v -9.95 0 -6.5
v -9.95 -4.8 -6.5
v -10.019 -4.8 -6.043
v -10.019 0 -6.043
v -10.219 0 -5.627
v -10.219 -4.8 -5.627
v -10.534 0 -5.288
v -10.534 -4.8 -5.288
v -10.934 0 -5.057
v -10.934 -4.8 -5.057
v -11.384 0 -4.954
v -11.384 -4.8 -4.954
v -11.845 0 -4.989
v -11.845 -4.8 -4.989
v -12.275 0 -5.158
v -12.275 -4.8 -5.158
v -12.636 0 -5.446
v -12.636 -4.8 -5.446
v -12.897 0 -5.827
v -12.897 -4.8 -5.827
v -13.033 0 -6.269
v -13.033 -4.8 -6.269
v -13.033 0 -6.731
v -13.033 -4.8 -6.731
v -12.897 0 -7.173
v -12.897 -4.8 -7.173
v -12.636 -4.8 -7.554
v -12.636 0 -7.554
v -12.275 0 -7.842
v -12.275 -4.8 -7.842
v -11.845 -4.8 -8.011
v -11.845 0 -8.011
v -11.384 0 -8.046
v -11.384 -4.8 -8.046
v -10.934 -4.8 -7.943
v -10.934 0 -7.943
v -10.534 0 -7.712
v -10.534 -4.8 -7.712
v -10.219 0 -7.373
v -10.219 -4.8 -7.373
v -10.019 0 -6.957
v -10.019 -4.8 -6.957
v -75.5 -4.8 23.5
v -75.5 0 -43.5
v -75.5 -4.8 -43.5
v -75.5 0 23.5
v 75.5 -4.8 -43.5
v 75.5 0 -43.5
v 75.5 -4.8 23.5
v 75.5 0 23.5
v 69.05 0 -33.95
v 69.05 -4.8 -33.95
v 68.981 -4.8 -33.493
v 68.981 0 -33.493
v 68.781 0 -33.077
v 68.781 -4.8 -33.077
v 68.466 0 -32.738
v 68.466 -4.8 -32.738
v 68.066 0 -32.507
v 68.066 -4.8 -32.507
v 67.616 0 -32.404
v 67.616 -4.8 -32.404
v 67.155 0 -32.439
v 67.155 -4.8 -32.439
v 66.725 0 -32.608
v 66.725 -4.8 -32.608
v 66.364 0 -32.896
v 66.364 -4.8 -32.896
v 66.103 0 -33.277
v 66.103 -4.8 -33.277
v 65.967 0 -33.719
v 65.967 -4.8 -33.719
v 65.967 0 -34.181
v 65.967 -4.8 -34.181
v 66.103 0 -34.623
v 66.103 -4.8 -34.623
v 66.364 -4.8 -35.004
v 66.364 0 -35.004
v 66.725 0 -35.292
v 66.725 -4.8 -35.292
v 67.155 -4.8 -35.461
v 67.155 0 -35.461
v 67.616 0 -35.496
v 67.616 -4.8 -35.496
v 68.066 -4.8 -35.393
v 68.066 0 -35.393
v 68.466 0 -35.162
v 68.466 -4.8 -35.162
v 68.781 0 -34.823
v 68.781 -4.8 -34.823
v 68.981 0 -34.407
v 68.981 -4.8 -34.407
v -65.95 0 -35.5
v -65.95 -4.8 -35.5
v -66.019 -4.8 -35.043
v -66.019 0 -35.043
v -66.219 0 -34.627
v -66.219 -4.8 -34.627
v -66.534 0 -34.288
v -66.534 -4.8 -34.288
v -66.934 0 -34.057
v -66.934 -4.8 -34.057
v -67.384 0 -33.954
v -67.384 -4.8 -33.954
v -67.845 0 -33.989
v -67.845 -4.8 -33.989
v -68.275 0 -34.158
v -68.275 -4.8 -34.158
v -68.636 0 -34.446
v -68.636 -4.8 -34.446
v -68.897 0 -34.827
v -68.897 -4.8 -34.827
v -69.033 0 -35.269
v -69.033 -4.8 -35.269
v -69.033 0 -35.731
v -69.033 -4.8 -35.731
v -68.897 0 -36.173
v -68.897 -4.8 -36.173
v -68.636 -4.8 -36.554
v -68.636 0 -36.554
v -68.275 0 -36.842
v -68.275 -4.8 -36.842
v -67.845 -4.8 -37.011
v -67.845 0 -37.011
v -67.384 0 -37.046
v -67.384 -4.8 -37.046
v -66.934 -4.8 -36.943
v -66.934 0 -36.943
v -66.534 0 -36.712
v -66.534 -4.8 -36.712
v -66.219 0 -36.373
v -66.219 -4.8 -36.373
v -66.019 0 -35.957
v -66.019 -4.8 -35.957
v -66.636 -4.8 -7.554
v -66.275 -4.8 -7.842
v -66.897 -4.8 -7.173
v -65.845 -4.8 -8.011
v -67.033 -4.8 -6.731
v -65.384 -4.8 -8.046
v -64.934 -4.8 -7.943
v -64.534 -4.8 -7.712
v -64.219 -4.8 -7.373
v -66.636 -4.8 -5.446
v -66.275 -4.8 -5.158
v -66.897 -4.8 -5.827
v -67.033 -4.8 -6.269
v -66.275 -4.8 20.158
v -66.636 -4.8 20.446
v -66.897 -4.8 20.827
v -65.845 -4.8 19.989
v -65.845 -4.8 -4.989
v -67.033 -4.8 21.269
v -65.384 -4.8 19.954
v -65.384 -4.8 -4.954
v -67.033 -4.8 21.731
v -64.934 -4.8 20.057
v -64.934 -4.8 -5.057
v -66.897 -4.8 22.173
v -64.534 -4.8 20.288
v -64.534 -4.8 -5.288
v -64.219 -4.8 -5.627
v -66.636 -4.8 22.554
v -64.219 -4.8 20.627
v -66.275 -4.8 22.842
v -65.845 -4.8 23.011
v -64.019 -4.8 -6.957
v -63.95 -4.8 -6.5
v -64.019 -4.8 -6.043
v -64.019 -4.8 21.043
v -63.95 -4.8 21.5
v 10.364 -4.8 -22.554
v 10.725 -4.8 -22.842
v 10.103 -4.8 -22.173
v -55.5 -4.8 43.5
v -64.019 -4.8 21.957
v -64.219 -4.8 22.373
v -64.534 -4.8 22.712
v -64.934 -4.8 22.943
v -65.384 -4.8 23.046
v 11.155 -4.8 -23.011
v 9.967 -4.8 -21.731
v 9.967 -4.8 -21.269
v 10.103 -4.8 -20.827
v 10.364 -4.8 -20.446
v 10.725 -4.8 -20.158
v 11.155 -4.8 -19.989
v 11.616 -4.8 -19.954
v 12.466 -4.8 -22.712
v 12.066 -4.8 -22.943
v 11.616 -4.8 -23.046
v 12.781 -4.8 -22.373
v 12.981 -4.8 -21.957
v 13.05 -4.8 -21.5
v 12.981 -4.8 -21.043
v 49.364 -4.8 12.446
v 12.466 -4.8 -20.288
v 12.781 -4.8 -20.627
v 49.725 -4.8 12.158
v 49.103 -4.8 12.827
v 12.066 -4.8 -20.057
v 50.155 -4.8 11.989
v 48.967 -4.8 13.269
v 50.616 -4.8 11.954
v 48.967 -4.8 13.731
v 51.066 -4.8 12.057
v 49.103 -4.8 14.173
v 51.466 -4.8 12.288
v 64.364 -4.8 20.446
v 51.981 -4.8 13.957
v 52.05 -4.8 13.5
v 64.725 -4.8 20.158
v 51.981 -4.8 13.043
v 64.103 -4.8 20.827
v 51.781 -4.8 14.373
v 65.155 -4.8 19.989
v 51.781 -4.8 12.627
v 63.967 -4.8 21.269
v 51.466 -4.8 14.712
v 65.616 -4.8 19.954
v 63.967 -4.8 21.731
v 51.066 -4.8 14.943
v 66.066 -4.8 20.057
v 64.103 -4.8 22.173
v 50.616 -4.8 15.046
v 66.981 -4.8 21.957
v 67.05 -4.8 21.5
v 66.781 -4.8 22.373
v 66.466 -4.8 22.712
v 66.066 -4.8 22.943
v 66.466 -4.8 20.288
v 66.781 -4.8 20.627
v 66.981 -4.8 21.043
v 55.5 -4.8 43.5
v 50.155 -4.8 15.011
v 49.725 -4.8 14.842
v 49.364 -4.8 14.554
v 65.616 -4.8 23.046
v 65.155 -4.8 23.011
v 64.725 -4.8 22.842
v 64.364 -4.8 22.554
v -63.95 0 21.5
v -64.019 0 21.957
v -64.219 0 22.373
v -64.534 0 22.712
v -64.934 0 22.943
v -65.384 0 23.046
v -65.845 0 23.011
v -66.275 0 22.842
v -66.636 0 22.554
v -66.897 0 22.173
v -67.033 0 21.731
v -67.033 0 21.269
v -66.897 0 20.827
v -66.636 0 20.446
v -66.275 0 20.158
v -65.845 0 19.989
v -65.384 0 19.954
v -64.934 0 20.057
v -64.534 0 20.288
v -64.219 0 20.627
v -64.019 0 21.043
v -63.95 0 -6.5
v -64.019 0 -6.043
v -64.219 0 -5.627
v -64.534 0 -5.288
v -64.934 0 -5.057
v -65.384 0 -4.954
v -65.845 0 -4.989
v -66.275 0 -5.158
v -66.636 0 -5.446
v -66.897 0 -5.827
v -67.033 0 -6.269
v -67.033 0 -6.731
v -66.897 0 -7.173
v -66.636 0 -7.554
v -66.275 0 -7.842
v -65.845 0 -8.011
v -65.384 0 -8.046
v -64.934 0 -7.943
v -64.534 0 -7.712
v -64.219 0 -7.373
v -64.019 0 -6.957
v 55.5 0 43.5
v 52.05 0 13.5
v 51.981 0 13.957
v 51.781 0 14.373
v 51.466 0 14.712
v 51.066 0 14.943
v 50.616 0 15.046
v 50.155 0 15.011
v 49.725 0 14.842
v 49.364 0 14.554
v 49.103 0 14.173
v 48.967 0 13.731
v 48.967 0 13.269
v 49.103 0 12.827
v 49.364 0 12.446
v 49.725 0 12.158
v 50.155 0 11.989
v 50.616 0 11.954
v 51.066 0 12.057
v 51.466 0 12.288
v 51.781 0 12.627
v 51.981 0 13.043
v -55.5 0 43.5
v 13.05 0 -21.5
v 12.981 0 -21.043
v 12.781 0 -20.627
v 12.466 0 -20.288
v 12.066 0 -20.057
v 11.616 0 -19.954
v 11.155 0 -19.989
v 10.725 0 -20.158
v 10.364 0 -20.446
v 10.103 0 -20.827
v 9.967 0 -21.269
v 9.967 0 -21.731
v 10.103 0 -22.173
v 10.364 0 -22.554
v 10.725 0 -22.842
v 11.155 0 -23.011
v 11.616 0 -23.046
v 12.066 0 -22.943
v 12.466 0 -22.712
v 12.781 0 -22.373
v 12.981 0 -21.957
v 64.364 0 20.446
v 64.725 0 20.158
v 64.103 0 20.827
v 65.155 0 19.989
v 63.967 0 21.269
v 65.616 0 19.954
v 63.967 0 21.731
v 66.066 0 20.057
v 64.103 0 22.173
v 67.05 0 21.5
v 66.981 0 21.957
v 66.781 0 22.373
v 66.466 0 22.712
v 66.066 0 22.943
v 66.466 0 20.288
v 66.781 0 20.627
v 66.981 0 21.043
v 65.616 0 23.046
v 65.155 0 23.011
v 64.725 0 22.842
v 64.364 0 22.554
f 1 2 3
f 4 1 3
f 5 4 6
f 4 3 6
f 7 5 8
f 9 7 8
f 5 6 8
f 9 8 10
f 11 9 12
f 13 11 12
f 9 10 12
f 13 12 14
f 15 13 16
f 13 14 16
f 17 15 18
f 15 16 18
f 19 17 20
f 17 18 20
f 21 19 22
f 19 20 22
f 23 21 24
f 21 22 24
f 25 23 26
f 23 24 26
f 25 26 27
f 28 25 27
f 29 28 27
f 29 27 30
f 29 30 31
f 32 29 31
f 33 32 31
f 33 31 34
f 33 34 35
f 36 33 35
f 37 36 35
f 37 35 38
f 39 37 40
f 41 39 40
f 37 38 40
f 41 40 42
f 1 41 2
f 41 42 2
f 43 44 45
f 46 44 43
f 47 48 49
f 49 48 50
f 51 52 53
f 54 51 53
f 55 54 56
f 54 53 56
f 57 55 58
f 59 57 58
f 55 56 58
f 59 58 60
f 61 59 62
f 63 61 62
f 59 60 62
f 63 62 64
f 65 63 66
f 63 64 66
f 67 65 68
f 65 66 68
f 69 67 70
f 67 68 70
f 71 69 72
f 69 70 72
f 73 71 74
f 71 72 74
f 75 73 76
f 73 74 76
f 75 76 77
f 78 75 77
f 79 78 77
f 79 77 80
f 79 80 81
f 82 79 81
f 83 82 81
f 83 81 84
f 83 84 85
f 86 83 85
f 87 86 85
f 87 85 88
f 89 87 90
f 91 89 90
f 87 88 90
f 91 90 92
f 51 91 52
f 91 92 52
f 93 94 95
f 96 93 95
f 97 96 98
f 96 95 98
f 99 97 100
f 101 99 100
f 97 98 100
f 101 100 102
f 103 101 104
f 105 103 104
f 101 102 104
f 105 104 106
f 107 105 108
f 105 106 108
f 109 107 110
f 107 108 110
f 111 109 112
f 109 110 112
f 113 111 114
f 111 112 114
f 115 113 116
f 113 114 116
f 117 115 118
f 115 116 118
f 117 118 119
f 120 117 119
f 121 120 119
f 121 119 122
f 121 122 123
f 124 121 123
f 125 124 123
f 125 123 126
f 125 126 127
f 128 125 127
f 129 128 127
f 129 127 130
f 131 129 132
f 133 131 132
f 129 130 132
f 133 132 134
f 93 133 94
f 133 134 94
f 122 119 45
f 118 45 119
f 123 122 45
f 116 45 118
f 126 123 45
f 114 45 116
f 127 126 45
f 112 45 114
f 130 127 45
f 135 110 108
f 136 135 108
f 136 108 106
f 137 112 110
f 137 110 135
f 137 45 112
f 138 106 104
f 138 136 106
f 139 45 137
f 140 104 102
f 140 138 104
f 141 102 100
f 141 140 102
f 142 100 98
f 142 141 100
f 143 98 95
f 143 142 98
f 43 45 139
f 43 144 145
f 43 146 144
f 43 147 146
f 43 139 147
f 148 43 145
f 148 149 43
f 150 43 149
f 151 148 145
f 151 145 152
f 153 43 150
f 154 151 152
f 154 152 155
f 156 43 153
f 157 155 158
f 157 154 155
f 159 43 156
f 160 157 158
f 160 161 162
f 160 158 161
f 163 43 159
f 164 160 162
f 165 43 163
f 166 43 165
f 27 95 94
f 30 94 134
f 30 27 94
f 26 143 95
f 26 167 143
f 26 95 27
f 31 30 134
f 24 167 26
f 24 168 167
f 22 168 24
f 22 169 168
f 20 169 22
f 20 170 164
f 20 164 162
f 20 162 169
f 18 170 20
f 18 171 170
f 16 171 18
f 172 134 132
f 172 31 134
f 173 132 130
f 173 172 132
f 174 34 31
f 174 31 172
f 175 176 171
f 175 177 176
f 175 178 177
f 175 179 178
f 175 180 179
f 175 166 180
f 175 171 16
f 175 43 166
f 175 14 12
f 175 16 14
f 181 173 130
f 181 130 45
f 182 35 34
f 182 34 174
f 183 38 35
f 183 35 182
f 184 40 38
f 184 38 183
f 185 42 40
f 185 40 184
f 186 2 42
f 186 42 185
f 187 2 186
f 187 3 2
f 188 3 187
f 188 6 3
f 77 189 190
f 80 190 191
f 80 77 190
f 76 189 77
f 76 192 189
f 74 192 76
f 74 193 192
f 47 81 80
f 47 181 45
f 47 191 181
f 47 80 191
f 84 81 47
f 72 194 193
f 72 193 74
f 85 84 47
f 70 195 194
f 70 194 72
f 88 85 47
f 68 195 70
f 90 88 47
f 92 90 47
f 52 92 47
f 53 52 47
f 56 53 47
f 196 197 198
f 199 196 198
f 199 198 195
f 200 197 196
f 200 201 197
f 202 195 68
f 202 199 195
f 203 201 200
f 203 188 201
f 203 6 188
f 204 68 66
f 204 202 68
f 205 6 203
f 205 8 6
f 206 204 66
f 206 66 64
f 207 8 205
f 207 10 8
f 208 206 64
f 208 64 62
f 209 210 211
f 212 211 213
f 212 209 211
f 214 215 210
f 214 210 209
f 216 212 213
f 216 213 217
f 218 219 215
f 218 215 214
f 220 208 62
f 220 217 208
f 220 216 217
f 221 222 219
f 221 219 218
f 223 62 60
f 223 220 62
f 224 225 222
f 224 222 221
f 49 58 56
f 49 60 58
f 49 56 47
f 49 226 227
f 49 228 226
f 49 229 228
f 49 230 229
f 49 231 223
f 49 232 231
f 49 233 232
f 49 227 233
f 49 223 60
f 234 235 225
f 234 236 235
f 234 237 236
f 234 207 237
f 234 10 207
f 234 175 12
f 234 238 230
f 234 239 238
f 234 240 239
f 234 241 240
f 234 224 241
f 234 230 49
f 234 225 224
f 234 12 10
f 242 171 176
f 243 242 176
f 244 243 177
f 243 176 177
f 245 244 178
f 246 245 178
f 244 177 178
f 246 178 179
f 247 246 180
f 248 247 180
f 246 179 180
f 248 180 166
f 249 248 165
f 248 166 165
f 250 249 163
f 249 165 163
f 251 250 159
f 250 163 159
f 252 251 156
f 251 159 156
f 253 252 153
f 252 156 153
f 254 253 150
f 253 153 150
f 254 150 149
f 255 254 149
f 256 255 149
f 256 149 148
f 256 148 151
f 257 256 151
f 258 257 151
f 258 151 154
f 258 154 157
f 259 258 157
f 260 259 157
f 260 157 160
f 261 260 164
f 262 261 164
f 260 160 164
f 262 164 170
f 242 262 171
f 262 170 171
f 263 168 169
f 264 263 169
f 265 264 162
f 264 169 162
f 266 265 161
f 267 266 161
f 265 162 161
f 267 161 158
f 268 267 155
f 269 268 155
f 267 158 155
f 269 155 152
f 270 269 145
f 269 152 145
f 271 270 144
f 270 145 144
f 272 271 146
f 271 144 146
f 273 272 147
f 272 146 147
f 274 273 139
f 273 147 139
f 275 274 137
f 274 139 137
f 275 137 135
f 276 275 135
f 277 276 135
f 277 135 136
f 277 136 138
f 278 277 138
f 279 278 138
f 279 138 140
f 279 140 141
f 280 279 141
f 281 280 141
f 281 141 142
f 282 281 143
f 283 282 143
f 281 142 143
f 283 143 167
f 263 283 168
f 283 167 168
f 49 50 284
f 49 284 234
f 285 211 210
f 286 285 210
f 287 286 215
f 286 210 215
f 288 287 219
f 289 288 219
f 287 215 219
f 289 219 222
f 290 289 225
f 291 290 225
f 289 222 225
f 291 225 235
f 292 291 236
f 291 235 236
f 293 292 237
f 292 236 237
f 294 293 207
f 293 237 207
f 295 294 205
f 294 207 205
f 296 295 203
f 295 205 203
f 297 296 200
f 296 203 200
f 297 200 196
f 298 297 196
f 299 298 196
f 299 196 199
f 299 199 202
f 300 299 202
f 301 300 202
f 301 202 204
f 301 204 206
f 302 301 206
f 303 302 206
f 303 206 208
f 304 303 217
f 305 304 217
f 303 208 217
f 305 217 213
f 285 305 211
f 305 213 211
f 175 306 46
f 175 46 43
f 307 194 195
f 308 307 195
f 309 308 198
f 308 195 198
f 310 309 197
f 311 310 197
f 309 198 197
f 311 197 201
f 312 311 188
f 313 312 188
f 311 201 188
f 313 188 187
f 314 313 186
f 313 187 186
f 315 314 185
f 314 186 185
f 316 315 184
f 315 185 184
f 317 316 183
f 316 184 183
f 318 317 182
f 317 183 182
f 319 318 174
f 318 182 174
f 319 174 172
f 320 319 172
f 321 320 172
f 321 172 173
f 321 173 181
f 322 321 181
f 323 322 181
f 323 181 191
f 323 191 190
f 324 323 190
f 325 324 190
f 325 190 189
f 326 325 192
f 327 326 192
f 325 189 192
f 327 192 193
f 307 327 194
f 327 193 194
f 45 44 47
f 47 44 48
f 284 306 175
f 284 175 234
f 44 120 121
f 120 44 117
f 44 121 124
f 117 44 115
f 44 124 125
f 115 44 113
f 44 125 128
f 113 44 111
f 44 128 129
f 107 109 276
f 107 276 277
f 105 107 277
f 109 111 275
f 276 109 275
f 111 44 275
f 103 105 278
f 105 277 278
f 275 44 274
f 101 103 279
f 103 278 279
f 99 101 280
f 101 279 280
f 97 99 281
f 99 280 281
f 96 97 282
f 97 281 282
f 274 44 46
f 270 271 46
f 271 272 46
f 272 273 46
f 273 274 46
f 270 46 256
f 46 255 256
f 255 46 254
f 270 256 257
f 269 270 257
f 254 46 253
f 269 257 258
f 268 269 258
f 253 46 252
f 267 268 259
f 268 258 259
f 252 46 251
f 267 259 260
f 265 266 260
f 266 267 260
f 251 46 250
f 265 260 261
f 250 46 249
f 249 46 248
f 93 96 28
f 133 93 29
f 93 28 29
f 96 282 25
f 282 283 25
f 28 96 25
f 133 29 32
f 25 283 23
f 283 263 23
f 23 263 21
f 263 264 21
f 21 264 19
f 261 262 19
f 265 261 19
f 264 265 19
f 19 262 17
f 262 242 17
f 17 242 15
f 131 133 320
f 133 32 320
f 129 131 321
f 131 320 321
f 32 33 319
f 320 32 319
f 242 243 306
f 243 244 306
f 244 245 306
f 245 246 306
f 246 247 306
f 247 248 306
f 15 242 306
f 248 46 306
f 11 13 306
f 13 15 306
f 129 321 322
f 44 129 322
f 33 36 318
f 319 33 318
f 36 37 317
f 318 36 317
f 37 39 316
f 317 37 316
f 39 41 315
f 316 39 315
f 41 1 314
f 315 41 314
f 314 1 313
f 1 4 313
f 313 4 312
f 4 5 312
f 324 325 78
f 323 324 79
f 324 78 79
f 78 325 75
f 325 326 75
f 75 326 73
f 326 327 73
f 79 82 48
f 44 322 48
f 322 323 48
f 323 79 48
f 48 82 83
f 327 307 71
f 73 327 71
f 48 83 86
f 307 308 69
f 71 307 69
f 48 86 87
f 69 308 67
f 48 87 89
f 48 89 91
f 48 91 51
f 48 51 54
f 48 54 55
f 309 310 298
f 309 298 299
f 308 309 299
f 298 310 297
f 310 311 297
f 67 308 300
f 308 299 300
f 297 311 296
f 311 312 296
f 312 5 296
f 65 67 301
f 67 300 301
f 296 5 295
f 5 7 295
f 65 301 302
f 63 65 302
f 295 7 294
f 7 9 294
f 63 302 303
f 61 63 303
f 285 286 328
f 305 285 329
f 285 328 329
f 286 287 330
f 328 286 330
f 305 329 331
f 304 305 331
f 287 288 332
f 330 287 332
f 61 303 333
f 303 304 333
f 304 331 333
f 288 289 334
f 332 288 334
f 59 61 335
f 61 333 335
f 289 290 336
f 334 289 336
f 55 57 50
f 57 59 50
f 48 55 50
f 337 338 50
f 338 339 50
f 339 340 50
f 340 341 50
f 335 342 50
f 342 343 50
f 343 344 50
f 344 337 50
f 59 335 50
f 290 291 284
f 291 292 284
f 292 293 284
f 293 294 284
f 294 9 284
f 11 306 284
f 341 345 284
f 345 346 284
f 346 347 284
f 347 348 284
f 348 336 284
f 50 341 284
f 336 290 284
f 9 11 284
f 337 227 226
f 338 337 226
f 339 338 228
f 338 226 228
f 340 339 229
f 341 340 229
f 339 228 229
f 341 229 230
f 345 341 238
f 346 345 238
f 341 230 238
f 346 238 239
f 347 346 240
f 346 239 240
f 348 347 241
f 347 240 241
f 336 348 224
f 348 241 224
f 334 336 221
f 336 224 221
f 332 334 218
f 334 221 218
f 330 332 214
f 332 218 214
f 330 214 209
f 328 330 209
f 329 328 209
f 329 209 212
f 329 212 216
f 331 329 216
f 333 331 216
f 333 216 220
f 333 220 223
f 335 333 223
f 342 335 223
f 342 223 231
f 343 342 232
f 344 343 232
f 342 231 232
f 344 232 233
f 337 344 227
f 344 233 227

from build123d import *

# Parameters (mm, degrees)
F0_W     = 151
F0_H     = 87
F1_DEPTH = 4.8
F2_R     = 1.55
F3_DEPTH = 4.8
F4_DEPTH = 4.8
F5_SIZE  = 20
F6_SIZE  = 20


with BuildPart() as f1:
    # F0 (on Front) → F1 (new body)
    with BuildSketch(Plane.XZ):
        Rectangle(F0_W, F0_H)
    extrude(amount=F1_DEPTH)

    # F2 (on face) → F3 (cut)
    with BuildSketch(Plane.XZ.offset(4.8)):
        with Locations((-65.5, -6.5)):
            Circle(F2_R)
    extrude(amount=-F3_DEPTH, mode=Mode.SUBTRACT)

    # F2 (on face) → F4 (cut)
    with BuildSketch(Plane.XZ.offset(4.8)):
        with Locations((-65.5, 21.5)):
            Circle(F2_R)
        with Locations((65.5, 21.5)):
            Circle(F2_R)
        with Locations((-67.5, -35.5)):
            Circle(F2_R)
        with Locations((67.5, -33.95)):
            Circle(F2_R)
        with Locations((50.5, 13.5)):
            Circle(F2_R)
        with Locations((11.5, -21.5)):
            Circle(F2_R)
        with Locations((-65.5, -6.5)):
            Circle(F2_R)
        with Locations((-11.5, -6.5)):
            Circle(F2_R)
    extrude(amount=-F4_DEPTH, mode=Mode.SUBTRACT)

    # F5
    f5_edges = [f1.edges().sort_by_distance(p)[0] for p in [
        (-75.5, -2.4, 43.5),
    ]]
    chamfer(f5_edges, length=F5_SIZE)

    # F6
    f6_edges = [f1.edges().sort_by_distance(p)[0] for p in [
        (75.5, -2.4, 43.5),
    ]]
    chamfer(f6_edges, length=F6_SIZE)


solid = f1.part
